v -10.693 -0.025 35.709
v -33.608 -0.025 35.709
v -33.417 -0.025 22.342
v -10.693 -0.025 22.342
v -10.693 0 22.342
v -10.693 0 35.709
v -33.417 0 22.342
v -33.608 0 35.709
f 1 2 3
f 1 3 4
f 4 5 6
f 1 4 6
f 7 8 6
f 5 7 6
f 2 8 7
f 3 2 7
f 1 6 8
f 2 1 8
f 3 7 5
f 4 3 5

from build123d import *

# Parameters (mm, degrees)
F1_DEPTH = 0.254
F3_DEPTH = 0.0254


with BuildPart() as f1:
    # F0 (on Front) → F1 (new body)
    with BuildSketch(Plane.XZ):
        Polygon((-41.43716, 34.944702), (-60.532626, 35.326611), (-60.532626, 21.195969), (-41.43716, 21.195969), align=None)
    extrude(amount=F1_DEPTH)


with BuildPart() as f3:
    # F2 (on Front) → F3 (new body)
    with BuildSketch(Plane.XZ):
        Polygon((-10.693461, 35.708521), (-33.608019, 35.708521), (-33.417065, 22.341695), (-10.693461, 22.341695), align=None)
    extrude(amount=F3_DEPTH)


solid = f3.part
